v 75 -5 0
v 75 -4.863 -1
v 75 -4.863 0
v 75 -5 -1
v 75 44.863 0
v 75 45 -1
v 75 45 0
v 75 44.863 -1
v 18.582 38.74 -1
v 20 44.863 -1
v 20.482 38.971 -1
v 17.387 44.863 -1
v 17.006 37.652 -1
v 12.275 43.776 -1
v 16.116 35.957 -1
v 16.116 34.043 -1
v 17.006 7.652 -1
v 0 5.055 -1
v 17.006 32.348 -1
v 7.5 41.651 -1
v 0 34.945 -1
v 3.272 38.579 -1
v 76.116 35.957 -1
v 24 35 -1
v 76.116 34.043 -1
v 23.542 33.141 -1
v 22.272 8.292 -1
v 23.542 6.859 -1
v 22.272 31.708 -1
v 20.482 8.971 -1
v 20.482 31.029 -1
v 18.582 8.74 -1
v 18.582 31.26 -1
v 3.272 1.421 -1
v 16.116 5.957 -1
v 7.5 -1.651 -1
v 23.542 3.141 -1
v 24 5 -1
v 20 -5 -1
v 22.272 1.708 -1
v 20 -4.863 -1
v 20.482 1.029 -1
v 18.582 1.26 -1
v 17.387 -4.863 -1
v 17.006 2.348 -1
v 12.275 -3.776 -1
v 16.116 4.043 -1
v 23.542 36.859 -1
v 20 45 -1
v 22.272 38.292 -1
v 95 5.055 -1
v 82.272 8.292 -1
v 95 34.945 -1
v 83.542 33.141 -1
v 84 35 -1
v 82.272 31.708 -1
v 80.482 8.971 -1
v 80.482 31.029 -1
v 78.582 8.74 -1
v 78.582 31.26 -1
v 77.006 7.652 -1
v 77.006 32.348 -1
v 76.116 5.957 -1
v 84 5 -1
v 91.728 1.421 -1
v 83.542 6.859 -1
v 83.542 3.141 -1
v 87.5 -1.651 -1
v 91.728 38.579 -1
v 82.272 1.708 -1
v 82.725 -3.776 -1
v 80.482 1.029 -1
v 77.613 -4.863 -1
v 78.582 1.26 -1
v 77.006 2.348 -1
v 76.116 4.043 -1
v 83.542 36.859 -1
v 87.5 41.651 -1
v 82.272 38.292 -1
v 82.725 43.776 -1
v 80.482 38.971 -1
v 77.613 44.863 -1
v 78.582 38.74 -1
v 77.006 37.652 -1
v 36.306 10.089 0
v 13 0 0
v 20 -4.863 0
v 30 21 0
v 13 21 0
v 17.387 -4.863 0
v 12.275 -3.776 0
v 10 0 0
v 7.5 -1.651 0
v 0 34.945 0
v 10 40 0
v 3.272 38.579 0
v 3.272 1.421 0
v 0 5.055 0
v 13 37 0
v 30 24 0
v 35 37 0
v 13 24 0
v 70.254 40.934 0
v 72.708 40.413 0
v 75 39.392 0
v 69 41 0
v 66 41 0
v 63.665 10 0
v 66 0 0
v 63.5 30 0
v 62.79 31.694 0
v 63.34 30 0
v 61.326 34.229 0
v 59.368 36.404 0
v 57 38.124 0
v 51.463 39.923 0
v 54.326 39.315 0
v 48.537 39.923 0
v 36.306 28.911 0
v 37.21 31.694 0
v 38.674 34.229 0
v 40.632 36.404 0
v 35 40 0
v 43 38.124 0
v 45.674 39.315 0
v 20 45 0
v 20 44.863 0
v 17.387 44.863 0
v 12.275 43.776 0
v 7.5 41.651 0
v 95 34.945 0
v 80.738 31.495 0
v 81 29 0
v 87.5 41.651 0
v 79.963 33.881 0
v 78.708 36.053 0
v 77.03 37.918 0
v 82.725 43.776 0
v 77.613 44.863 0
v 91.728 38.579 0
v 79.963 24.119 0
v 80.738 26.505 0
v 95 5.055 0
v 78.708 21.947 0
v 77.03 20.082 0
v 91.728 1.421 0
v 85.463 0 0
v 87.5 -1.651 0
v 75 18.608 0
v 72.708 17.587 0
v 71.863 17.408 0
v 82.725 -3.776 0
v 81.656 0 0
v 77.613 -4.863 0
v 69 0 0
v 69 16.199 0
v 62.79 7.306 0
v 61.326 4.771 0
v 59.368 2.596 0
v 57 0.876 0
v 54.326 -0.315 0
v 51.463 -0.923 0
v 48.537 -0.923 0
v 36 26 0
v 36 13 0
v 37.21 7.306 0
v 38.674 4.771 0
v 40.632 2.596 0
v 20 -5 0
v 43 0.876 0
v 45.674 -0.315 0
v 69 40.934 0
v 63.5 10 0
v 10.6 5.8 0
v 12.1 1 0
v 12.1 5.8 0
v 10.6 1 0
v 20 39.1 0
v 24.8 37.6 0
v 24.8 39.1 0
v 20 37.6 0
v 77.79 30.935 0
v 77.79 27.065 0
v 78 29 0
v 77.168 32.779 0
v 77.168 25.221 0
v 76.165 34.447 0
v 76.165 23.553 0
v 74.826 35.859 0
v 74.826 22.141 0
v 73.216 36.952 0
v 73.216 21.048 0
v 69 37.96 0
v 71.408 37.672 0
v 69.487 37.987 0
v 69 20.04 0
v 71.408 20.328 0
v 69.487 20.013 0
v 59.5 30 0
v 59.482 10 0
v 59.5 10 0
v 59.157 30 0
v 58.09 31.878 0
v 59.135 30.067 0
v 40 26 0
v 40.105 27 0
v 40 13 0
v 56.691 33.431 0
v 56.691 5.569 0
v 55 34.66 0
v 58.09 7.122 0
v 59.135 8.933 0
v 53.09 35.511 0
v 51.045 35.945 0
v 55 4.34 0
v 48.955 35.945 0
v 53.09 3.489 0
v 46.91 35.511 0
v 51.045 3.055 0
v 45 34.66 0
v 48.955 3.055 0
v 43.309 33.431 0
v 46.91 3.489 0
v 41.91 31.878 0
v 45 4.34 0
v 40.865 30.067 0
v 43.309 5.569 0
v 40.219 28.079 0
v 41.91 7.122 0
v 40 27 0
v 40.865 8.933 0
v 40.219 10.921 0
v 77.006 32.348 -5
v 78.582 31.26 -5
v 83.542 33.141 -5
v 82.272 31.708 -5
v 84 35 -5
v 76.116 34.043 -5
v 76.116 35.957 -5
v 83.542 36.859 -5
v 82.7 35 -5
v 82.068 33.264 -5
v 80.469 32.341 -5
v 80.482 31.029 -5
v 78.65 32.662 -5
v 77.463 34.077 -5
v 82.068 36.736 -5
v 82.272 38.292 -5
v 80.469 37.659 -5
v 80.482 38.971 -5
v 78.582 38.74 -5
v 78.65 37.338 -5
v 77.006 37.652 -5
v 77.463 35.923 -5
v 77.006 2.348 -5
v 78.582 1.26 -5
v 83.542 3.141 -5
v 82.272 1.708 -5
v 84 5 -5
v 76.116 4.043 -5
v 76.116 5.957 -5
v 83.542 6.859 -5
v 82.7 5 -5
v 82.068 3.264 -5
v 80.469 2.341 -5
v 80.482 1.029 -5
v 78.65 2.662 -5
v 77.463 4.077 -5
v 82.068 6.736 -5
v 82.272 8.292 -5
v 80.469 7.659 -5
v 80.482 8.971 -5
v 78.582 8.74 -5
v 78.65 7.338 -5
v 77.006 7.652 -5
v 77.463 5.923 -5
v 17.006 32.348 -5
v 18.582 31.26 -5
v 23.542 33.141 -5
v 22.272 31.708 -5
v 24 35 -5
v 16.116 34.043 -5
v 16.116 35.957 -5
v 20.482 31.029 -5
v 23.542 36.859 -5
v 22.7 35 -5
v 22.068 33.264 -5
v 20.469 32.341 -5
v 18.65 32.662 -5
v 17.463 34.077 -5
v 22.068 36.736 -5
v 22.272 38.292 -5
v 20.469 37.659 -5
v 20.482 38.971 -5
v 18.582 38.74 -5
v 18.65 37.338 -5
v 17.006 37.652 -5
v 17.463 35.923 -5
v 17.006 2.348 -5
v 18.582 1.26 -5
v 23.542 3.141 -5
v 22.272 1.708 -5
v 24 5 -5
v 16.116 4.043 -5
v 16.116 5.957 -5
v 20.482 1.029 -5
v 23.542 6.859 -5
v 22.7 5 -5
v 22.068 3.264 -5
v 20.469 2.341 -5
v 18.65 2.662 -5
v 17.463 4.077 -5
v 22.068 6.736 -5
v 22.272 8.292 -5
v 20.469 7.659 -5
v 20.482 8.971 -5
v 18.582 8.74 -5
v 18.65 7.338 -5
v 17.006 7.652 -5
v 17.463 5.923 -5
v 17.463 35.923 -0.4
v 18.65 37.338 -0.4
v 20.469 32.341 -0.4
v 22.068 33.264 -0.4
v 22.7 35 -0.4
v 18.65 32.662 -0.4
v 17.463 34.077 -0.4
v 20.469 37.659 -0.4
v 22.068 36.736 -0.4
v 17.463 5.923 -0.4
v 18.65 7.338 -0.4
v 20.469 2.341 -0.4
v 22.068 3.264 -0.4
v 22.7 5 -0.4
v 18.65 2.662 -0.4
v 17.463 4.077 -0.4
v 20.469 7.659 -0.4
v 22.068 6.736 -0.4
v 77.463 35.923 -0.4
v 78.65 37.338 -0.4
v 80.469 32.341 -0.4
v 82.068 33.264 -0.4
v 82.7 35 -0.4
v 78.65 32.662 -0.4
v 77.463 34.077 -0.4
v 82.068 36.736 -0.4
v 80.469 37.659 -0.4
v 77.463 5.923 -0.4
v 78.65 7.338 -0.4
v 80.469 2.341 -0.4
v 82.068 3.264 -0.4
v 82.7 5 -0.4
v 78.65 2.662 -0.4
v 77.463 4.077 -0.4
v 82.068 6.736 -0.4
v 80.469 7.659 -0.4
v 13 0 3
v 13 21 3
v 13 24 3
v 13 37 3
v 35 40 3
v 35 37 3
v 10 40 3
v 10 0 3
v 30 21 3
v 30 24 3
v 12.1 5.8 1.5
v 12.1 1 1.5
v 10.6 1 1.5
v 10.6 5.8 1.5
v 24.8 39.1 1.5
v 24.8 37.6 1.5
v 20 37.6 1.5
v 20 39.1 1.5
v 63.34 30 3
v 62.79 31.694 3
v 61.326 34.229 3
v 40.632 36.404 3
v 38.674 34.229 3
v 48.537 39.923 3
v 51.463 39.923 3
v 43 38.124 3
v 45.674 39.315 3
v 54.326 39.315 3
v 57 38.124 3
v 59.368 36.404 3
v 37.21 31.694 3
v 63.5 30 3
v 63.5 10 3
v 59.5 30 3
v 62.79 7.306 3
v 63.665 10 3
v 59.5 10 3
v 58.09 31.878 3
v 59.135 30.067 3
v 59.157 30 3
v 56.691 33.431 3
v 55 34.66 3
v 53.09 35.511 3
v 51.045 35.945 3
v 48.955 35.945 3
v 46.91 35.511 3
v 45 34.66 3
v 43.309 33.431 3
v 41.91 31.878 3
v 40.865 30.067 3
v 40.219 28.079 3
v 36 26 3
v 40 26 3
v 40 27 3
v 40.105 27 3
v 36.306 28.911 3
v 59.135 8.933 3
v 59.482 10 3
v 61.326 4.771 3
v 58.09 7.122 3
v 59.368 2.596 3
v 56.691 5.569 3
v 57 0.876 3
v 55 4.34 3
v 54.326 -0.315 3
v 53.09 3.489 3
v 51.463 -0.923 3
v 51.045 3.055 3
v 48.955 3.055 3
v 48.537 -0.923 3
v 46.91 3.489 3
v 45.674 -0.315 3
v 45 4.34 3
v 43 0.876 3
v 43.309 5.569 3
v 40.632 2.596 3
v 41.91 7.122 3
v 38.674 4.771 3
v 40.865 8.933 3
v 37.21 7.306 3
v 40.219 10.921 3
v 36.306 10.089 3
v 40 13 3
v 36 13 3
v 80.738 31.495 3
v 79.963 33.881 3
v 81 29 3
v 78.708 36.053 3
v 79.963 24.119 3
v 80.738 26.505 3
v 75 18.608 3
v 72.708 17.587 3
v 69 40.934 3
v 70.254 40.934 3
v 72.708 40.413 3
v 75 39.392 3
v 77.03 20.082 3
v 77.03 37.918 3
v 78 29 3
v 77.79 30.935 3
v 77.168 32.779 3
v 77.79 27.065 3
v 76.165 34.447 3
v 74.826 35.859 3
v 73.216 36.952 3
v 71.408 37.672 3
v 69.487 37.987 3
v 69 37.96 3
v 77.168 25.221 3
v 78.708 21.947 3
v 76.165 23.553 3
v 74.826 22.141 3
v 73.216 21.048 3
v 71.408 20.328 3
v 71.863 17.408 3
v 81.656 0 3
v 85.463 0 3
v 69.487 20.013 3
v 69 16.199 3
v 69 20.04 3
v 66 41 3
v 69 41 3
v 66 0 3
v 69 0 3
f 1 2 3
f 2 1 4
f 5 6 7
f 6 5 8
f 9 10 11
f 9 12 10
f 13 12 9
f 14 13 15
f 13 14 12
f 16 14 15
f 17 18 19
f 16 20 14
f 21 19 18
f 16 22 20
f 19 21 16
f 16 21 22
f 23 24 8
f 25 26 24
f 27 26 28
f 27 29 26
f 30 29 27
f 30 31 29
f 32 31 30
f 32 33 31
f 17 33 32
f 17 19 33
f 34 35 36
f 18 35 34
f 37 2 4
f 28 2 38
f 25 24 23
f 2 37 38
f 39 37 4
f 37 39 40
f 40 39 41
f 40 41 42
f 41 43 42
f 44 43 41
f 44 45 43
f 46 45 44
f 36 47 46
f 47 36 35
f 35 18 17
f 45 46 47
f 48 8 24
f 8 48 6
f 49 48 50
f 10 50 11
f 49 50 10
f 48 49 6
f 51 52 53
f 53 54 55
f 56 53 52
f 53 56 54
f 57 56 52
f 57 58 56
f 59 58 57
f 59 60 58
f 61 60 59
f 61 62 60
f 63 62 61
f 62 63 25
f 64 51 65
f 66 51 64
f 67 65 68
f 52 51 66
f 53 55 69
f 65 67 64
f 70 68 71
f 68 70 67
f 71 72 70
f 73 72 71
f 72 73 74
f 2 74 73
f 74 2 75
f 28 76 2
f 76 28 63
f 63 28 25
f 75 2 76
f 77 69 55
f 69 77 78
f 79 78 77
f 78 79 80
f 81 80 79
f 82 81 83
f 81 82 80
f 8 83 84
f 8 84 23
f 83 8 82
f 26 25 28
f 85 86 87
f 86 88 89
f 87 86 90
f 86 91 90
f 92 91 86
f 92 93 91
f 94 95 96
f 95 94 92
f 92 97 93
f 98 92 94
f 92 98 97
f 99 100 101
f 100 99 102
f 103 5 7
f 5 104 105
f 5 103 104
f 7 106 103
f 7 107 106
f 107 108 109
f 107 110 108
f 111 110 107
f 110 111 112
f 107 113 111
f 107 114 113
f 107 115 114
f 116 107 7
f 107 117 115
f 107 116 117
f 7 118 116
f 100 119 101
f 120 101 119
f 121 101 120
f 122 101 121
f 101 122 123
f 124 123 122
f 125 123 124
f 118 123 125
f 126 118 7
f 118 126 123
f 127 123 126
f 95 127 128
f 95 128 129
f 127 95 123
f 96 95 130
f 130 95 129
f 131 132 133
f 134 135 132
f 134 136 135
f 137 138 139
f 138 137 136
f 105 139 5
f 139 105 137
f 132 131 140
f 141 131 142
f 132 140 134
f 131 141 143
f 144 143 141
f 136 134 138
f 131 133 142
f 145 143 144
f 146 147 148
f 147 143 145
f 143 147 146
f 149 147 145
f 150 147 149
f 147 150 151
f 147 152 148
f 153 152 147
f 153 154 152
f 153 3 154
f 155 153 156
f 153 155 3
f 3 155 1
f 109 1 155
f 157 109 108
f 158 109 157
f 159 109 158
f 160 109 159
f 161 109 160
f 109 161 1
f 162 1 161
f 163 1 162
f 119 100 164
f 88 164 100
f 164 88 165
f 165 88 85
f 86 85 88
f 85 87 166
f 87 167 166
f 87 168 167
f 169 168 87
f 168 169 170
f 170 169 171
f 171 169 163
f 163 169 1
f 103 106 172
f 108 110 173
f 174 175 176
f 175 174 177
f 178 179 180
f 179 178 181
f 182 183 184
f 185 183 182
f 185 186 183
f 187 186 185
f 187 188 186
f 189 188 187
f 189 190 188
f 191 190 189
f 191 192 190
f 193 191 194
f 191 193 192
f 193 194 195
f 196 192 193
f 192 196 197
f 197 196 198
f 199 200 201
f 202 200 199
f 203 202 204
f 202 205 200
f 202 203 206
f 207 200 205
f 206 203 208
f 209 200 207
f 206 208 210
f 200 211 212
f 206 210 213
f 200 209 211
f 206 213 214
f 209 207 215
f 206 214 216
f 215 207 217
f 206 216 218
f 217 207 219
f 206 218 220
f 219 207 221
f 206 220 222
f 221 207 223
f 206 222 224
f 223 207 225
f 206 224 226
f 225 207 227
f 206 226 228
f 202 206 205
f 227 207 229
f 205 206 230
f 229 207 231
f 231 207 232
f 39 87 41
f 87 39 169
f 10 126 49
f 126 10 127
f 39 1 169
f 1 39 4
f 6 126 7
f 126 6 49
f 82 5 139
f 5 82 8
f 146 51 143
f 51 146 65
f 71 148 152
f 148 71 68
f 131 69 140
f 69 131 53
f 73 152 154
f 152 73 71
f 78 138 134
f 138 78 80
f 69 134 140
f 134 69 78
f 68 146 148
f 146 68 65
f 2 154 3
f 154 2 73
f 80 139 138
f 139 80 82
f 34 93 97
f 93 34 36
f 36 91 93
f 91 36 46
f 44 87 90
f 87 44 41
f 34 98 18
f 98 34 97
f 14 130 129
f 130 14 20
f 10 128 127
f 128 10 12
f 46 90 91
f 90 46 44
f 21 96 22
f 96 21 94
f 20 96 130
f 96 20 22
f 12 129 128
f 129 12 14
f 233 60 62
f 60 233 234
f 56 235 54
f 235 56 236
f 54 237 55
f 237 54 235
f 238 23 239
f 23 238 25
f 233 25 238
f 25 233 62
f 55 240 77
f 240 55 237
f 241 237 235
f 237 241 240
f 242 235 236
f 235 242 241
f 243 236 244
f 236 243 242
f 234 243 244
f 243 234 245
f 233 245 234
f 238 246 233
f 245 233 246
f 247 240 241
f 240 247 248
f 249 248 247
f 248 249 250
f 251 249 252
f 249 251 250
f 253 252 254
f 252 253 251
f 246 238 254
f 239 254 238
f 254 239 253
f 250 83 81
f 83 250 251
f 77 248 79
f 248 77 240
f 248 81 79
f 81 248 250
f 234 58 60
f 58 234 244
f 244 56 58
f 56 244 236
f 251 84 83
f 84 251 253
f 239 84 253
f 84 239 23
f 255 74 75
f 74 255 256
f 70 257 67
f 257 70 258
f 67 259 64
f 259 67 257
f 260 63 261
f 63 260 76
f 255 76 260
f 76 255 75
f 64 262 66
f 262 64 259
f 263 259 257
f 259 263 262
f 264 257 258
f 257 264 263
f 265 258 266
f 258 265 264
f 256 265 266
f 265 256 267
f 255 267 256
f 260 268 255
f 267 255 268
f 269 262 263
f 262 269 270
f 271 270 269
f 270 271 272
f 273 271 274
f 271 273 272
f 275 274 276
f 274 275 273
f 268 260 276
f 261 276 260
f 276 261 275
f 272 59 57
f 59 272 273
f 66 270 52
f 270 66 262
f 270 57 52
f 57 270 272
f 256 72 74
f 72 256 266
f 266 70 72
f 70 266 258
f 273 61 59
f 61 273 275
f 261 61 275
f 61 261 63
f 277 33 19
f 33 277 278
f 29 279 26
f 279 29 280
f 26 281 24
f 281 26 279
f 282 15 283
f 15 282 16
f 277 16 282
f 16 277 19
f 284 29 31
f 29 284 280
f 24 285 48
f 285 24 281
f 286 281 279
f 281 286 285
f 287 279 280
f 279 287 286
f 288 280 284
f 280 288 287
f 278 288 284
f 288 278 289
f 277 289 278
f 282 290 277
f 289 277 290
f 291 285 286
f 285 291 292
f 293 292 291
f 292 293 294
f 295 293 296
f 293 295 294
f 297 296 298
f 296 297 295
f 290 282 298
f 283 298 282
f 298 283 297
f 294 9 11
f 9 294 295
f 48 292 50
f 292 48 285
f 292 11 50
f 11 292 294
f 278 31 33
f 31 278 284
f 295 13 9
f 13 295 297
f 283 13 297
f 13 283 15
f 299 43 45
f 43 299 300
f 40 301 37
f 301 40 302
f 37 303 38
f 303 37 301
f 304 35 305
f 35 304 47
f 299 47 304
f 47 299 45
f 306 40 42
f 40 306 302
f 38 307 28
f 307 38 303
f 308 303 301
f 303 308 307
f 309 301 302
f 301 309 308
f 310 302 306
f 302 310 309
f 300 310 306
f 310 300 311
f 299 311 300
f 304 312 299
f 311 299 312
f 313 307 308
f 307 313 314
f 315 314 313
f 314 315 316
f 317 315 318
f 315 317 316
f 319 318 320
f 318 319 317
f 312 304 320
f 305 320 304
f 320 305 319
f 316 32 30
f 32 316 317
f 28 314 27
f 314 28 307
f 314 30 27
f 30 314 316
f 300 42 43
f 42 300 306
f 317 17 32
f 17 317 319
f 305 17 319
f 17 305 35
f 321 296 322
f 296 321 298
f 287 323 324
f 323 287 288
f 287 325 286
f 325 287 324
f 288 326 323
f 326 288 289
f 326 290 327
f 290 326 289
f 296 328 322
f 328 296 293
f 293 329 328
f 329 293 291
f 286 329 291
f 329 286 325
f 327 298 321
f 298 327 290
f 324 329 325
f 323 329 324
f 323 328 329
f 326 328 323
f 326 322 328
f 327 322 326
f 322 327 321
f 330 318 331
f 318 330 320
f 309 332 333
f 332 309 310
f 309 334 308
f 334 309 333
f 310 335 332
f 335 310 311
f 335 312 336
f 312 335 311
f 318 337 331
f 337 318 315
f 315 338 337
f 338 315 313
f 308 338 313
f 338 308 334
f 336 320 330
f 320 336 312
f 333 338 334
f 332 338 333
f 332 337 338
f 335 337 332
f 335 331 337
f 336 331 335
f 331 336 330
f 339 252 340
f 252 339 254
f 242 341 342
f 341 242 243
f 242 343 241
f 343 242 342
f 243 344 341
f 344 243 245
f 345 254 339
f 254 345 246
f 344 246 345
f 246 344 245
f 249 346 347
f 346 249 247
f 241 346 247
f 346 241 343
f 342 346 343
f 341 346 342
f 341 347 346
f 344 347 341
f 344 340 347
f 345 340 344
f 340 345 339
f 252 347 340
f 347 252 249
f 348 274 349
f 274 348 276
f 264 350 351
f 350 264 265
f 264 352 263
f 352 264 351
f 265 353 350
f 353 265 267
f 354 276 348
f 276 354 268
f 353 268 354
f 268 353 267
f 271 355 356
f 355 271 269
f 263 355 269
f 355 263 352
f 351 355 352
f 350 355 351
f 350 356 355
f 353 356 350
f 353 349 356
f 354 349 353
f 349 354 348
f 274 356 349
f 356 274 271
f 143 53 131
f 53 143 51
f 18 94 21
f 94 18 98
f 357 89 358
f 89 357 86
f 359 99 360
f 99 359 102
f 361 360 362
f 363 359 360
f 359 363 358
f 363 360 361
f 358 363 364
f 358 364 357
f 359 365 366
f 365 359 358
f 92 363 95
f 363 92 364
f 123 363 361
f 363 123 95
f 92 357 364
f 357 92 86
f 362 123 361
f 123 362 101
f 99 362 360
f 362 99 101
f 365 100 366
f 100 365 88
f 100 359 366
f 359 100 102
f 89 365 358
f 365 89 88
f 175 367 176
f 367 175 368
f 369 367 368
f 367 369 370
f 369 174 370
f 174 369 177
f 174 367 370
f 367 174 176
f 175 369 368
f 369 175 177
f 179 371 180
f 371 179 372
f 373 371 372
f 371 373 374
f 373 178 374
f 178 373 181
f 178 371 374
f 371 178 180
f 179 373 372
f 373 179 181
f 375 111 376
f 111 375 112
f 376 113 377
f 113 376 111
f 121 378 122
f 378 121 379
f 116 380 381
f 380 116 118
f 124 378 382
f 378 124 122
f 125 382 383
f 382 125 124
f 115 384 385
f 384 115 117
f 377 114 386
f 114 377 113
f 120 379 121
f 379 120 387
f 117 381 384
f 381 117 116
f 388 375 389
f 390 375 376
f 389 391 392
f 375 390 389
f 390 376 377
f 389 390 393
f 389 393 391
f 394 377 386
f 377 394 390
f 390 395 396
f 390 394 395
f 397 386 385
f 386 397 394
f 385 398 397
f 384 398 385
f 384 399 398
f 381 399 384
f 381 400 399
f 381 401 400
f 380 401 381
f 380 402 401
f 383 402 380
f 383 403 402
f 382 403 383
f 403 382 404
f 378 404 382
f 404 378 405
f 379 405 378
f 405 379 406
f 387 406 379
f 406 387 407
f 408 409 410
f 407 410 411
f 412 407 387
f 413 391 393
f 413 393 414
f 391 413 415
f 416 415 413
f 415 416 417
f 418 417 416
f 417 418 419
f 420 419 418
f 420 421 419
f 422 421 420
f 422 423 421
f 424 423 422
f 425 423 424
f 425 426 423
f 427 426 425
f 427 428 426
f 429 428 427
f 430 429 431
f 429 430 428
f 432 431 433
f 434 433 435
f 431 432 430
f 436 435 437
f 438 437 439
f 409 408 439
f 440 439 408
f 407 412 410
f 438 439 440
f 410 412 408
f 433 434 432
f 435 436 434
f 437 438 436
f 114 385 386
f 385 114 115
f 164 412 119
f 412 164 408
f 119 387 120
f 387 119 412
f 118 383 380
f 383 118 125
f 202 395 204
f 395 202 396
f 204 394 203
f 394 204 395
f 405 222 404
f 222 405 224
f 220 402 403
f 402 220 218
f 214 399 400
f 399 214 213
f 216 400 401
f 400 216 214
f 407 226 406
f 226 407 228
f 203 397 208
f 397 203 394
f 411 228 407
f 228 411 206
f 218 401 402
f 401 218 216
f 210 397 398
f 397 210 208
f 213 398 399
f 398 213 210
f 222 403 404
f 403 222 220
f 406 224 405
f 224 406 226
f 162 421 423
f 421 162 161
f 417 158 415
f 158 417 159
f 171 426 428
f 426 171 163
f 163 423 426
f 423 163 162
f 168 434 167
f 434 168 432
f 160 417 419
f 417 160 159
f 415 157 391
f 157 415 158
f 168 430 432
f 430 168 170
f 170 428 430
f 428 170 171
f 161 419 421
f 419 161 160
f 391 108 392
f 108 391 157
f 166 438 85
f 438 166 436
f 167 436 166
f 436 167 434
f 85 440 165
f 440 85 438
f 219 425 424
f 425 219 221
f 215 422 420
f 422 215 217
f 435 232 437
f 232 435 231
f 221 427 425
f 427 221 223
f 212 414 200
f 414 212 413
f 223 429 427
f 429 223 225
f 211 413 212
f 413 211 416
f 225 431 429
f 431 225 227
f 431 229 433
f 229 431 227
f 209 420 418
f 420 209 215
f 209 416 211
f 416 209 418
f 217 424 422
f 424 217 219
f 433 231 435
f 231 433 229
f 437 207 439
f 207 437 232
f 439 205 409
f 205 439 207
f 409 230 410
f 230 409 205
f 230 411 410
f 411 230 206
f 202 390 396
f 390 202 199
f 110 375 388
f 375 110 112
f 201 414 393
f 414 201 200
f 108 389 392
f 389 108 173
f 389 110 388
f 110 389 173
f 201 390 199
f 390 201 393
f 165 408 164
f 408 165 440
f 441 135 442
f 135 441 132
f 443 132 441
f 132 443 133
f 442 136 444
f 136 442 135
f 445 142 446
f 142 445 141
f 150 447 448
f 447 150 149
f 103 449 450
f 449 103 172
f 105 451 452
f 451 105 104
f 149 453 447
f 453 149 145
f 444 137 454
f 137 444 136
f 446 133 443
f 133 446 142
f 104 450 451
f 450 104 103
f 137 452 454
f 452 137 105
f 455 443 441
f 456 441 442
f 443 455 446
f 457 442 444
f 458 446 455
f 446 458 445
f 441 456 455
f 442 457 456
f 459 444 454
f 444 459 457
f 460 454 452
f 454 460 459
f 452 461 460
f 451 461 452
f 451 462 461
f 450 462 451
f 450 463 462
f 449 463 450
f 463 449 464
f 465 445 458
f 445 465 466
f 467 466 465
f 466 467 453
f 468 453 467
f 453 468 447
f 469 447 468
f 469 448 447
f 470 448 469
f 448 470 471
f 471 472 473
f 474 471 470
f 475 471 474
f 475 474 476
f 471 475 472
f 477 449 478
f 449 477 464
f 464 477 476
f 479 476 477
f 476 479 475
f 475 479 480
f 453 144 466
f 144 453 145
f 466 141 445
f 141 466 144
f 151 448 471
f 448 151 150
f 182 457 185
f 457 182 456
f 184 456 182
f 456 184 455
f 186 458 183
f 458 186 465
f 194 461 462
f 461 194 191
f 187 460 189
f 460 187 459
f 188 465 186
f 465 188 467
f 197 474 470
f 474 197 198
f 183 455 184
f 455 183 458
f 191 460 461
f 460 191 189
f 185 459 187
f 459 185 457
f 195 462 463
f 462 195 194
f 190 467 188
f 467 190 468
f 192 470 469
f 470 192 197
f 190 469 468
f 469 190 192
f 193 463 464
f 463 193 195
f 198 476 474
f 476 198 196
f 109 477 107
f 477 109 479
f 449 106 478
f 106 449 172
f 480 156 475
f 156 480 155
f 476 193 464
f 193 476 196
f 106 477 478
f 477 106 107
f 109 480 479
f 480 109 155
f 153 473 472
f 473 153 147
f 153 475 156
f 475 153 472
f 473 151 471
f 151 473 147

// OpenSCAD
 union(){ 
	rotate([0,900,180]) translate([20,-45,0])
 difference(){  
  union(){  
	cube([55,50,1]);
   	translate([55,25,0]) cylinder(1,25,25);
   	translate([0,25,0]) cylinder(1,25,25);

  translate([60,10,0]) cylinder(5,4,4);
  translate([60,40,0]) cylinder(5,4,4);
  translate([0,10,0]) cylinder(5,4,4);
  translate([0,40,0]) cylinder(5,4,4);
}
  

  #translate([0,10,0.4]) cylinder(5,2.7,2.7);
  #translate([0,40,0.4]) cylinder(5,2.7,2.7);
  #translate([60,10,0.4]) cylinder(5,2.7,2.7);
  #translate([60,40,0.4]) cylinder(5,2.7,2.7);
  #translate([75,0,-2]) cube([5,50,9]);
  #translate([-25,0,-2]) cube([5,50,9]);
  }
//F
	translate([10,0,0])
 difference(){
  union(){
  cube([3,40,3]);
  translate([0,37,0]) cube([25,3,3]);
  translate([0,21,0]) cube([20,3,3]);
}
 translate([0.6,1,0]) cube([1.5,4.8,1.5]);
 translate([10,37.6,0]) cube([4.8,1.5,1.5]);

}


//О
	translate([10,0,0])
 union(){
  translate([49.5,10,0]) cube([4,20,3]);
  translate([26,13,0]) cube([4,13,3]);
 difference(){
 union(){
	
  difference(){
  translate([40,26,0]) cylinder(3,14,14);
  translate([40,26,-1]) cylinder(5,10,10);
  translate([33,10,-1]) cube([20,10,5]);

}

 difference(){
  translate([40,13,0]) cylinder(3,14,14);
  translate([40,13,-1]) cylinder(5,10,10);
  translate([32,17,-1]) cube([19,10,5]);
  translate([40,17,-1]) cube(20);
}
}
  translate([30,13,-1]) cube([5,14,5]);
  translate([42,10,-1]) cube(20);
}
}

//R
	translate([66,0,0])
 union(){
  difference(){
  	union(){
     cube([3,41,3]);
 difference(){
  translate([3,29,0]) cylinder(3,12,12);
  translate([3,29,-1]) cylinder(5,9,9);
  translate([-15,5,-1]) cube([15,40,5]);
}
	translate([18,-3,0]) rotate([0,0,38]) cube([3,26,3]);
}
  translate([0,-13,-1]) cube([40,13,5]);

}
}
}
